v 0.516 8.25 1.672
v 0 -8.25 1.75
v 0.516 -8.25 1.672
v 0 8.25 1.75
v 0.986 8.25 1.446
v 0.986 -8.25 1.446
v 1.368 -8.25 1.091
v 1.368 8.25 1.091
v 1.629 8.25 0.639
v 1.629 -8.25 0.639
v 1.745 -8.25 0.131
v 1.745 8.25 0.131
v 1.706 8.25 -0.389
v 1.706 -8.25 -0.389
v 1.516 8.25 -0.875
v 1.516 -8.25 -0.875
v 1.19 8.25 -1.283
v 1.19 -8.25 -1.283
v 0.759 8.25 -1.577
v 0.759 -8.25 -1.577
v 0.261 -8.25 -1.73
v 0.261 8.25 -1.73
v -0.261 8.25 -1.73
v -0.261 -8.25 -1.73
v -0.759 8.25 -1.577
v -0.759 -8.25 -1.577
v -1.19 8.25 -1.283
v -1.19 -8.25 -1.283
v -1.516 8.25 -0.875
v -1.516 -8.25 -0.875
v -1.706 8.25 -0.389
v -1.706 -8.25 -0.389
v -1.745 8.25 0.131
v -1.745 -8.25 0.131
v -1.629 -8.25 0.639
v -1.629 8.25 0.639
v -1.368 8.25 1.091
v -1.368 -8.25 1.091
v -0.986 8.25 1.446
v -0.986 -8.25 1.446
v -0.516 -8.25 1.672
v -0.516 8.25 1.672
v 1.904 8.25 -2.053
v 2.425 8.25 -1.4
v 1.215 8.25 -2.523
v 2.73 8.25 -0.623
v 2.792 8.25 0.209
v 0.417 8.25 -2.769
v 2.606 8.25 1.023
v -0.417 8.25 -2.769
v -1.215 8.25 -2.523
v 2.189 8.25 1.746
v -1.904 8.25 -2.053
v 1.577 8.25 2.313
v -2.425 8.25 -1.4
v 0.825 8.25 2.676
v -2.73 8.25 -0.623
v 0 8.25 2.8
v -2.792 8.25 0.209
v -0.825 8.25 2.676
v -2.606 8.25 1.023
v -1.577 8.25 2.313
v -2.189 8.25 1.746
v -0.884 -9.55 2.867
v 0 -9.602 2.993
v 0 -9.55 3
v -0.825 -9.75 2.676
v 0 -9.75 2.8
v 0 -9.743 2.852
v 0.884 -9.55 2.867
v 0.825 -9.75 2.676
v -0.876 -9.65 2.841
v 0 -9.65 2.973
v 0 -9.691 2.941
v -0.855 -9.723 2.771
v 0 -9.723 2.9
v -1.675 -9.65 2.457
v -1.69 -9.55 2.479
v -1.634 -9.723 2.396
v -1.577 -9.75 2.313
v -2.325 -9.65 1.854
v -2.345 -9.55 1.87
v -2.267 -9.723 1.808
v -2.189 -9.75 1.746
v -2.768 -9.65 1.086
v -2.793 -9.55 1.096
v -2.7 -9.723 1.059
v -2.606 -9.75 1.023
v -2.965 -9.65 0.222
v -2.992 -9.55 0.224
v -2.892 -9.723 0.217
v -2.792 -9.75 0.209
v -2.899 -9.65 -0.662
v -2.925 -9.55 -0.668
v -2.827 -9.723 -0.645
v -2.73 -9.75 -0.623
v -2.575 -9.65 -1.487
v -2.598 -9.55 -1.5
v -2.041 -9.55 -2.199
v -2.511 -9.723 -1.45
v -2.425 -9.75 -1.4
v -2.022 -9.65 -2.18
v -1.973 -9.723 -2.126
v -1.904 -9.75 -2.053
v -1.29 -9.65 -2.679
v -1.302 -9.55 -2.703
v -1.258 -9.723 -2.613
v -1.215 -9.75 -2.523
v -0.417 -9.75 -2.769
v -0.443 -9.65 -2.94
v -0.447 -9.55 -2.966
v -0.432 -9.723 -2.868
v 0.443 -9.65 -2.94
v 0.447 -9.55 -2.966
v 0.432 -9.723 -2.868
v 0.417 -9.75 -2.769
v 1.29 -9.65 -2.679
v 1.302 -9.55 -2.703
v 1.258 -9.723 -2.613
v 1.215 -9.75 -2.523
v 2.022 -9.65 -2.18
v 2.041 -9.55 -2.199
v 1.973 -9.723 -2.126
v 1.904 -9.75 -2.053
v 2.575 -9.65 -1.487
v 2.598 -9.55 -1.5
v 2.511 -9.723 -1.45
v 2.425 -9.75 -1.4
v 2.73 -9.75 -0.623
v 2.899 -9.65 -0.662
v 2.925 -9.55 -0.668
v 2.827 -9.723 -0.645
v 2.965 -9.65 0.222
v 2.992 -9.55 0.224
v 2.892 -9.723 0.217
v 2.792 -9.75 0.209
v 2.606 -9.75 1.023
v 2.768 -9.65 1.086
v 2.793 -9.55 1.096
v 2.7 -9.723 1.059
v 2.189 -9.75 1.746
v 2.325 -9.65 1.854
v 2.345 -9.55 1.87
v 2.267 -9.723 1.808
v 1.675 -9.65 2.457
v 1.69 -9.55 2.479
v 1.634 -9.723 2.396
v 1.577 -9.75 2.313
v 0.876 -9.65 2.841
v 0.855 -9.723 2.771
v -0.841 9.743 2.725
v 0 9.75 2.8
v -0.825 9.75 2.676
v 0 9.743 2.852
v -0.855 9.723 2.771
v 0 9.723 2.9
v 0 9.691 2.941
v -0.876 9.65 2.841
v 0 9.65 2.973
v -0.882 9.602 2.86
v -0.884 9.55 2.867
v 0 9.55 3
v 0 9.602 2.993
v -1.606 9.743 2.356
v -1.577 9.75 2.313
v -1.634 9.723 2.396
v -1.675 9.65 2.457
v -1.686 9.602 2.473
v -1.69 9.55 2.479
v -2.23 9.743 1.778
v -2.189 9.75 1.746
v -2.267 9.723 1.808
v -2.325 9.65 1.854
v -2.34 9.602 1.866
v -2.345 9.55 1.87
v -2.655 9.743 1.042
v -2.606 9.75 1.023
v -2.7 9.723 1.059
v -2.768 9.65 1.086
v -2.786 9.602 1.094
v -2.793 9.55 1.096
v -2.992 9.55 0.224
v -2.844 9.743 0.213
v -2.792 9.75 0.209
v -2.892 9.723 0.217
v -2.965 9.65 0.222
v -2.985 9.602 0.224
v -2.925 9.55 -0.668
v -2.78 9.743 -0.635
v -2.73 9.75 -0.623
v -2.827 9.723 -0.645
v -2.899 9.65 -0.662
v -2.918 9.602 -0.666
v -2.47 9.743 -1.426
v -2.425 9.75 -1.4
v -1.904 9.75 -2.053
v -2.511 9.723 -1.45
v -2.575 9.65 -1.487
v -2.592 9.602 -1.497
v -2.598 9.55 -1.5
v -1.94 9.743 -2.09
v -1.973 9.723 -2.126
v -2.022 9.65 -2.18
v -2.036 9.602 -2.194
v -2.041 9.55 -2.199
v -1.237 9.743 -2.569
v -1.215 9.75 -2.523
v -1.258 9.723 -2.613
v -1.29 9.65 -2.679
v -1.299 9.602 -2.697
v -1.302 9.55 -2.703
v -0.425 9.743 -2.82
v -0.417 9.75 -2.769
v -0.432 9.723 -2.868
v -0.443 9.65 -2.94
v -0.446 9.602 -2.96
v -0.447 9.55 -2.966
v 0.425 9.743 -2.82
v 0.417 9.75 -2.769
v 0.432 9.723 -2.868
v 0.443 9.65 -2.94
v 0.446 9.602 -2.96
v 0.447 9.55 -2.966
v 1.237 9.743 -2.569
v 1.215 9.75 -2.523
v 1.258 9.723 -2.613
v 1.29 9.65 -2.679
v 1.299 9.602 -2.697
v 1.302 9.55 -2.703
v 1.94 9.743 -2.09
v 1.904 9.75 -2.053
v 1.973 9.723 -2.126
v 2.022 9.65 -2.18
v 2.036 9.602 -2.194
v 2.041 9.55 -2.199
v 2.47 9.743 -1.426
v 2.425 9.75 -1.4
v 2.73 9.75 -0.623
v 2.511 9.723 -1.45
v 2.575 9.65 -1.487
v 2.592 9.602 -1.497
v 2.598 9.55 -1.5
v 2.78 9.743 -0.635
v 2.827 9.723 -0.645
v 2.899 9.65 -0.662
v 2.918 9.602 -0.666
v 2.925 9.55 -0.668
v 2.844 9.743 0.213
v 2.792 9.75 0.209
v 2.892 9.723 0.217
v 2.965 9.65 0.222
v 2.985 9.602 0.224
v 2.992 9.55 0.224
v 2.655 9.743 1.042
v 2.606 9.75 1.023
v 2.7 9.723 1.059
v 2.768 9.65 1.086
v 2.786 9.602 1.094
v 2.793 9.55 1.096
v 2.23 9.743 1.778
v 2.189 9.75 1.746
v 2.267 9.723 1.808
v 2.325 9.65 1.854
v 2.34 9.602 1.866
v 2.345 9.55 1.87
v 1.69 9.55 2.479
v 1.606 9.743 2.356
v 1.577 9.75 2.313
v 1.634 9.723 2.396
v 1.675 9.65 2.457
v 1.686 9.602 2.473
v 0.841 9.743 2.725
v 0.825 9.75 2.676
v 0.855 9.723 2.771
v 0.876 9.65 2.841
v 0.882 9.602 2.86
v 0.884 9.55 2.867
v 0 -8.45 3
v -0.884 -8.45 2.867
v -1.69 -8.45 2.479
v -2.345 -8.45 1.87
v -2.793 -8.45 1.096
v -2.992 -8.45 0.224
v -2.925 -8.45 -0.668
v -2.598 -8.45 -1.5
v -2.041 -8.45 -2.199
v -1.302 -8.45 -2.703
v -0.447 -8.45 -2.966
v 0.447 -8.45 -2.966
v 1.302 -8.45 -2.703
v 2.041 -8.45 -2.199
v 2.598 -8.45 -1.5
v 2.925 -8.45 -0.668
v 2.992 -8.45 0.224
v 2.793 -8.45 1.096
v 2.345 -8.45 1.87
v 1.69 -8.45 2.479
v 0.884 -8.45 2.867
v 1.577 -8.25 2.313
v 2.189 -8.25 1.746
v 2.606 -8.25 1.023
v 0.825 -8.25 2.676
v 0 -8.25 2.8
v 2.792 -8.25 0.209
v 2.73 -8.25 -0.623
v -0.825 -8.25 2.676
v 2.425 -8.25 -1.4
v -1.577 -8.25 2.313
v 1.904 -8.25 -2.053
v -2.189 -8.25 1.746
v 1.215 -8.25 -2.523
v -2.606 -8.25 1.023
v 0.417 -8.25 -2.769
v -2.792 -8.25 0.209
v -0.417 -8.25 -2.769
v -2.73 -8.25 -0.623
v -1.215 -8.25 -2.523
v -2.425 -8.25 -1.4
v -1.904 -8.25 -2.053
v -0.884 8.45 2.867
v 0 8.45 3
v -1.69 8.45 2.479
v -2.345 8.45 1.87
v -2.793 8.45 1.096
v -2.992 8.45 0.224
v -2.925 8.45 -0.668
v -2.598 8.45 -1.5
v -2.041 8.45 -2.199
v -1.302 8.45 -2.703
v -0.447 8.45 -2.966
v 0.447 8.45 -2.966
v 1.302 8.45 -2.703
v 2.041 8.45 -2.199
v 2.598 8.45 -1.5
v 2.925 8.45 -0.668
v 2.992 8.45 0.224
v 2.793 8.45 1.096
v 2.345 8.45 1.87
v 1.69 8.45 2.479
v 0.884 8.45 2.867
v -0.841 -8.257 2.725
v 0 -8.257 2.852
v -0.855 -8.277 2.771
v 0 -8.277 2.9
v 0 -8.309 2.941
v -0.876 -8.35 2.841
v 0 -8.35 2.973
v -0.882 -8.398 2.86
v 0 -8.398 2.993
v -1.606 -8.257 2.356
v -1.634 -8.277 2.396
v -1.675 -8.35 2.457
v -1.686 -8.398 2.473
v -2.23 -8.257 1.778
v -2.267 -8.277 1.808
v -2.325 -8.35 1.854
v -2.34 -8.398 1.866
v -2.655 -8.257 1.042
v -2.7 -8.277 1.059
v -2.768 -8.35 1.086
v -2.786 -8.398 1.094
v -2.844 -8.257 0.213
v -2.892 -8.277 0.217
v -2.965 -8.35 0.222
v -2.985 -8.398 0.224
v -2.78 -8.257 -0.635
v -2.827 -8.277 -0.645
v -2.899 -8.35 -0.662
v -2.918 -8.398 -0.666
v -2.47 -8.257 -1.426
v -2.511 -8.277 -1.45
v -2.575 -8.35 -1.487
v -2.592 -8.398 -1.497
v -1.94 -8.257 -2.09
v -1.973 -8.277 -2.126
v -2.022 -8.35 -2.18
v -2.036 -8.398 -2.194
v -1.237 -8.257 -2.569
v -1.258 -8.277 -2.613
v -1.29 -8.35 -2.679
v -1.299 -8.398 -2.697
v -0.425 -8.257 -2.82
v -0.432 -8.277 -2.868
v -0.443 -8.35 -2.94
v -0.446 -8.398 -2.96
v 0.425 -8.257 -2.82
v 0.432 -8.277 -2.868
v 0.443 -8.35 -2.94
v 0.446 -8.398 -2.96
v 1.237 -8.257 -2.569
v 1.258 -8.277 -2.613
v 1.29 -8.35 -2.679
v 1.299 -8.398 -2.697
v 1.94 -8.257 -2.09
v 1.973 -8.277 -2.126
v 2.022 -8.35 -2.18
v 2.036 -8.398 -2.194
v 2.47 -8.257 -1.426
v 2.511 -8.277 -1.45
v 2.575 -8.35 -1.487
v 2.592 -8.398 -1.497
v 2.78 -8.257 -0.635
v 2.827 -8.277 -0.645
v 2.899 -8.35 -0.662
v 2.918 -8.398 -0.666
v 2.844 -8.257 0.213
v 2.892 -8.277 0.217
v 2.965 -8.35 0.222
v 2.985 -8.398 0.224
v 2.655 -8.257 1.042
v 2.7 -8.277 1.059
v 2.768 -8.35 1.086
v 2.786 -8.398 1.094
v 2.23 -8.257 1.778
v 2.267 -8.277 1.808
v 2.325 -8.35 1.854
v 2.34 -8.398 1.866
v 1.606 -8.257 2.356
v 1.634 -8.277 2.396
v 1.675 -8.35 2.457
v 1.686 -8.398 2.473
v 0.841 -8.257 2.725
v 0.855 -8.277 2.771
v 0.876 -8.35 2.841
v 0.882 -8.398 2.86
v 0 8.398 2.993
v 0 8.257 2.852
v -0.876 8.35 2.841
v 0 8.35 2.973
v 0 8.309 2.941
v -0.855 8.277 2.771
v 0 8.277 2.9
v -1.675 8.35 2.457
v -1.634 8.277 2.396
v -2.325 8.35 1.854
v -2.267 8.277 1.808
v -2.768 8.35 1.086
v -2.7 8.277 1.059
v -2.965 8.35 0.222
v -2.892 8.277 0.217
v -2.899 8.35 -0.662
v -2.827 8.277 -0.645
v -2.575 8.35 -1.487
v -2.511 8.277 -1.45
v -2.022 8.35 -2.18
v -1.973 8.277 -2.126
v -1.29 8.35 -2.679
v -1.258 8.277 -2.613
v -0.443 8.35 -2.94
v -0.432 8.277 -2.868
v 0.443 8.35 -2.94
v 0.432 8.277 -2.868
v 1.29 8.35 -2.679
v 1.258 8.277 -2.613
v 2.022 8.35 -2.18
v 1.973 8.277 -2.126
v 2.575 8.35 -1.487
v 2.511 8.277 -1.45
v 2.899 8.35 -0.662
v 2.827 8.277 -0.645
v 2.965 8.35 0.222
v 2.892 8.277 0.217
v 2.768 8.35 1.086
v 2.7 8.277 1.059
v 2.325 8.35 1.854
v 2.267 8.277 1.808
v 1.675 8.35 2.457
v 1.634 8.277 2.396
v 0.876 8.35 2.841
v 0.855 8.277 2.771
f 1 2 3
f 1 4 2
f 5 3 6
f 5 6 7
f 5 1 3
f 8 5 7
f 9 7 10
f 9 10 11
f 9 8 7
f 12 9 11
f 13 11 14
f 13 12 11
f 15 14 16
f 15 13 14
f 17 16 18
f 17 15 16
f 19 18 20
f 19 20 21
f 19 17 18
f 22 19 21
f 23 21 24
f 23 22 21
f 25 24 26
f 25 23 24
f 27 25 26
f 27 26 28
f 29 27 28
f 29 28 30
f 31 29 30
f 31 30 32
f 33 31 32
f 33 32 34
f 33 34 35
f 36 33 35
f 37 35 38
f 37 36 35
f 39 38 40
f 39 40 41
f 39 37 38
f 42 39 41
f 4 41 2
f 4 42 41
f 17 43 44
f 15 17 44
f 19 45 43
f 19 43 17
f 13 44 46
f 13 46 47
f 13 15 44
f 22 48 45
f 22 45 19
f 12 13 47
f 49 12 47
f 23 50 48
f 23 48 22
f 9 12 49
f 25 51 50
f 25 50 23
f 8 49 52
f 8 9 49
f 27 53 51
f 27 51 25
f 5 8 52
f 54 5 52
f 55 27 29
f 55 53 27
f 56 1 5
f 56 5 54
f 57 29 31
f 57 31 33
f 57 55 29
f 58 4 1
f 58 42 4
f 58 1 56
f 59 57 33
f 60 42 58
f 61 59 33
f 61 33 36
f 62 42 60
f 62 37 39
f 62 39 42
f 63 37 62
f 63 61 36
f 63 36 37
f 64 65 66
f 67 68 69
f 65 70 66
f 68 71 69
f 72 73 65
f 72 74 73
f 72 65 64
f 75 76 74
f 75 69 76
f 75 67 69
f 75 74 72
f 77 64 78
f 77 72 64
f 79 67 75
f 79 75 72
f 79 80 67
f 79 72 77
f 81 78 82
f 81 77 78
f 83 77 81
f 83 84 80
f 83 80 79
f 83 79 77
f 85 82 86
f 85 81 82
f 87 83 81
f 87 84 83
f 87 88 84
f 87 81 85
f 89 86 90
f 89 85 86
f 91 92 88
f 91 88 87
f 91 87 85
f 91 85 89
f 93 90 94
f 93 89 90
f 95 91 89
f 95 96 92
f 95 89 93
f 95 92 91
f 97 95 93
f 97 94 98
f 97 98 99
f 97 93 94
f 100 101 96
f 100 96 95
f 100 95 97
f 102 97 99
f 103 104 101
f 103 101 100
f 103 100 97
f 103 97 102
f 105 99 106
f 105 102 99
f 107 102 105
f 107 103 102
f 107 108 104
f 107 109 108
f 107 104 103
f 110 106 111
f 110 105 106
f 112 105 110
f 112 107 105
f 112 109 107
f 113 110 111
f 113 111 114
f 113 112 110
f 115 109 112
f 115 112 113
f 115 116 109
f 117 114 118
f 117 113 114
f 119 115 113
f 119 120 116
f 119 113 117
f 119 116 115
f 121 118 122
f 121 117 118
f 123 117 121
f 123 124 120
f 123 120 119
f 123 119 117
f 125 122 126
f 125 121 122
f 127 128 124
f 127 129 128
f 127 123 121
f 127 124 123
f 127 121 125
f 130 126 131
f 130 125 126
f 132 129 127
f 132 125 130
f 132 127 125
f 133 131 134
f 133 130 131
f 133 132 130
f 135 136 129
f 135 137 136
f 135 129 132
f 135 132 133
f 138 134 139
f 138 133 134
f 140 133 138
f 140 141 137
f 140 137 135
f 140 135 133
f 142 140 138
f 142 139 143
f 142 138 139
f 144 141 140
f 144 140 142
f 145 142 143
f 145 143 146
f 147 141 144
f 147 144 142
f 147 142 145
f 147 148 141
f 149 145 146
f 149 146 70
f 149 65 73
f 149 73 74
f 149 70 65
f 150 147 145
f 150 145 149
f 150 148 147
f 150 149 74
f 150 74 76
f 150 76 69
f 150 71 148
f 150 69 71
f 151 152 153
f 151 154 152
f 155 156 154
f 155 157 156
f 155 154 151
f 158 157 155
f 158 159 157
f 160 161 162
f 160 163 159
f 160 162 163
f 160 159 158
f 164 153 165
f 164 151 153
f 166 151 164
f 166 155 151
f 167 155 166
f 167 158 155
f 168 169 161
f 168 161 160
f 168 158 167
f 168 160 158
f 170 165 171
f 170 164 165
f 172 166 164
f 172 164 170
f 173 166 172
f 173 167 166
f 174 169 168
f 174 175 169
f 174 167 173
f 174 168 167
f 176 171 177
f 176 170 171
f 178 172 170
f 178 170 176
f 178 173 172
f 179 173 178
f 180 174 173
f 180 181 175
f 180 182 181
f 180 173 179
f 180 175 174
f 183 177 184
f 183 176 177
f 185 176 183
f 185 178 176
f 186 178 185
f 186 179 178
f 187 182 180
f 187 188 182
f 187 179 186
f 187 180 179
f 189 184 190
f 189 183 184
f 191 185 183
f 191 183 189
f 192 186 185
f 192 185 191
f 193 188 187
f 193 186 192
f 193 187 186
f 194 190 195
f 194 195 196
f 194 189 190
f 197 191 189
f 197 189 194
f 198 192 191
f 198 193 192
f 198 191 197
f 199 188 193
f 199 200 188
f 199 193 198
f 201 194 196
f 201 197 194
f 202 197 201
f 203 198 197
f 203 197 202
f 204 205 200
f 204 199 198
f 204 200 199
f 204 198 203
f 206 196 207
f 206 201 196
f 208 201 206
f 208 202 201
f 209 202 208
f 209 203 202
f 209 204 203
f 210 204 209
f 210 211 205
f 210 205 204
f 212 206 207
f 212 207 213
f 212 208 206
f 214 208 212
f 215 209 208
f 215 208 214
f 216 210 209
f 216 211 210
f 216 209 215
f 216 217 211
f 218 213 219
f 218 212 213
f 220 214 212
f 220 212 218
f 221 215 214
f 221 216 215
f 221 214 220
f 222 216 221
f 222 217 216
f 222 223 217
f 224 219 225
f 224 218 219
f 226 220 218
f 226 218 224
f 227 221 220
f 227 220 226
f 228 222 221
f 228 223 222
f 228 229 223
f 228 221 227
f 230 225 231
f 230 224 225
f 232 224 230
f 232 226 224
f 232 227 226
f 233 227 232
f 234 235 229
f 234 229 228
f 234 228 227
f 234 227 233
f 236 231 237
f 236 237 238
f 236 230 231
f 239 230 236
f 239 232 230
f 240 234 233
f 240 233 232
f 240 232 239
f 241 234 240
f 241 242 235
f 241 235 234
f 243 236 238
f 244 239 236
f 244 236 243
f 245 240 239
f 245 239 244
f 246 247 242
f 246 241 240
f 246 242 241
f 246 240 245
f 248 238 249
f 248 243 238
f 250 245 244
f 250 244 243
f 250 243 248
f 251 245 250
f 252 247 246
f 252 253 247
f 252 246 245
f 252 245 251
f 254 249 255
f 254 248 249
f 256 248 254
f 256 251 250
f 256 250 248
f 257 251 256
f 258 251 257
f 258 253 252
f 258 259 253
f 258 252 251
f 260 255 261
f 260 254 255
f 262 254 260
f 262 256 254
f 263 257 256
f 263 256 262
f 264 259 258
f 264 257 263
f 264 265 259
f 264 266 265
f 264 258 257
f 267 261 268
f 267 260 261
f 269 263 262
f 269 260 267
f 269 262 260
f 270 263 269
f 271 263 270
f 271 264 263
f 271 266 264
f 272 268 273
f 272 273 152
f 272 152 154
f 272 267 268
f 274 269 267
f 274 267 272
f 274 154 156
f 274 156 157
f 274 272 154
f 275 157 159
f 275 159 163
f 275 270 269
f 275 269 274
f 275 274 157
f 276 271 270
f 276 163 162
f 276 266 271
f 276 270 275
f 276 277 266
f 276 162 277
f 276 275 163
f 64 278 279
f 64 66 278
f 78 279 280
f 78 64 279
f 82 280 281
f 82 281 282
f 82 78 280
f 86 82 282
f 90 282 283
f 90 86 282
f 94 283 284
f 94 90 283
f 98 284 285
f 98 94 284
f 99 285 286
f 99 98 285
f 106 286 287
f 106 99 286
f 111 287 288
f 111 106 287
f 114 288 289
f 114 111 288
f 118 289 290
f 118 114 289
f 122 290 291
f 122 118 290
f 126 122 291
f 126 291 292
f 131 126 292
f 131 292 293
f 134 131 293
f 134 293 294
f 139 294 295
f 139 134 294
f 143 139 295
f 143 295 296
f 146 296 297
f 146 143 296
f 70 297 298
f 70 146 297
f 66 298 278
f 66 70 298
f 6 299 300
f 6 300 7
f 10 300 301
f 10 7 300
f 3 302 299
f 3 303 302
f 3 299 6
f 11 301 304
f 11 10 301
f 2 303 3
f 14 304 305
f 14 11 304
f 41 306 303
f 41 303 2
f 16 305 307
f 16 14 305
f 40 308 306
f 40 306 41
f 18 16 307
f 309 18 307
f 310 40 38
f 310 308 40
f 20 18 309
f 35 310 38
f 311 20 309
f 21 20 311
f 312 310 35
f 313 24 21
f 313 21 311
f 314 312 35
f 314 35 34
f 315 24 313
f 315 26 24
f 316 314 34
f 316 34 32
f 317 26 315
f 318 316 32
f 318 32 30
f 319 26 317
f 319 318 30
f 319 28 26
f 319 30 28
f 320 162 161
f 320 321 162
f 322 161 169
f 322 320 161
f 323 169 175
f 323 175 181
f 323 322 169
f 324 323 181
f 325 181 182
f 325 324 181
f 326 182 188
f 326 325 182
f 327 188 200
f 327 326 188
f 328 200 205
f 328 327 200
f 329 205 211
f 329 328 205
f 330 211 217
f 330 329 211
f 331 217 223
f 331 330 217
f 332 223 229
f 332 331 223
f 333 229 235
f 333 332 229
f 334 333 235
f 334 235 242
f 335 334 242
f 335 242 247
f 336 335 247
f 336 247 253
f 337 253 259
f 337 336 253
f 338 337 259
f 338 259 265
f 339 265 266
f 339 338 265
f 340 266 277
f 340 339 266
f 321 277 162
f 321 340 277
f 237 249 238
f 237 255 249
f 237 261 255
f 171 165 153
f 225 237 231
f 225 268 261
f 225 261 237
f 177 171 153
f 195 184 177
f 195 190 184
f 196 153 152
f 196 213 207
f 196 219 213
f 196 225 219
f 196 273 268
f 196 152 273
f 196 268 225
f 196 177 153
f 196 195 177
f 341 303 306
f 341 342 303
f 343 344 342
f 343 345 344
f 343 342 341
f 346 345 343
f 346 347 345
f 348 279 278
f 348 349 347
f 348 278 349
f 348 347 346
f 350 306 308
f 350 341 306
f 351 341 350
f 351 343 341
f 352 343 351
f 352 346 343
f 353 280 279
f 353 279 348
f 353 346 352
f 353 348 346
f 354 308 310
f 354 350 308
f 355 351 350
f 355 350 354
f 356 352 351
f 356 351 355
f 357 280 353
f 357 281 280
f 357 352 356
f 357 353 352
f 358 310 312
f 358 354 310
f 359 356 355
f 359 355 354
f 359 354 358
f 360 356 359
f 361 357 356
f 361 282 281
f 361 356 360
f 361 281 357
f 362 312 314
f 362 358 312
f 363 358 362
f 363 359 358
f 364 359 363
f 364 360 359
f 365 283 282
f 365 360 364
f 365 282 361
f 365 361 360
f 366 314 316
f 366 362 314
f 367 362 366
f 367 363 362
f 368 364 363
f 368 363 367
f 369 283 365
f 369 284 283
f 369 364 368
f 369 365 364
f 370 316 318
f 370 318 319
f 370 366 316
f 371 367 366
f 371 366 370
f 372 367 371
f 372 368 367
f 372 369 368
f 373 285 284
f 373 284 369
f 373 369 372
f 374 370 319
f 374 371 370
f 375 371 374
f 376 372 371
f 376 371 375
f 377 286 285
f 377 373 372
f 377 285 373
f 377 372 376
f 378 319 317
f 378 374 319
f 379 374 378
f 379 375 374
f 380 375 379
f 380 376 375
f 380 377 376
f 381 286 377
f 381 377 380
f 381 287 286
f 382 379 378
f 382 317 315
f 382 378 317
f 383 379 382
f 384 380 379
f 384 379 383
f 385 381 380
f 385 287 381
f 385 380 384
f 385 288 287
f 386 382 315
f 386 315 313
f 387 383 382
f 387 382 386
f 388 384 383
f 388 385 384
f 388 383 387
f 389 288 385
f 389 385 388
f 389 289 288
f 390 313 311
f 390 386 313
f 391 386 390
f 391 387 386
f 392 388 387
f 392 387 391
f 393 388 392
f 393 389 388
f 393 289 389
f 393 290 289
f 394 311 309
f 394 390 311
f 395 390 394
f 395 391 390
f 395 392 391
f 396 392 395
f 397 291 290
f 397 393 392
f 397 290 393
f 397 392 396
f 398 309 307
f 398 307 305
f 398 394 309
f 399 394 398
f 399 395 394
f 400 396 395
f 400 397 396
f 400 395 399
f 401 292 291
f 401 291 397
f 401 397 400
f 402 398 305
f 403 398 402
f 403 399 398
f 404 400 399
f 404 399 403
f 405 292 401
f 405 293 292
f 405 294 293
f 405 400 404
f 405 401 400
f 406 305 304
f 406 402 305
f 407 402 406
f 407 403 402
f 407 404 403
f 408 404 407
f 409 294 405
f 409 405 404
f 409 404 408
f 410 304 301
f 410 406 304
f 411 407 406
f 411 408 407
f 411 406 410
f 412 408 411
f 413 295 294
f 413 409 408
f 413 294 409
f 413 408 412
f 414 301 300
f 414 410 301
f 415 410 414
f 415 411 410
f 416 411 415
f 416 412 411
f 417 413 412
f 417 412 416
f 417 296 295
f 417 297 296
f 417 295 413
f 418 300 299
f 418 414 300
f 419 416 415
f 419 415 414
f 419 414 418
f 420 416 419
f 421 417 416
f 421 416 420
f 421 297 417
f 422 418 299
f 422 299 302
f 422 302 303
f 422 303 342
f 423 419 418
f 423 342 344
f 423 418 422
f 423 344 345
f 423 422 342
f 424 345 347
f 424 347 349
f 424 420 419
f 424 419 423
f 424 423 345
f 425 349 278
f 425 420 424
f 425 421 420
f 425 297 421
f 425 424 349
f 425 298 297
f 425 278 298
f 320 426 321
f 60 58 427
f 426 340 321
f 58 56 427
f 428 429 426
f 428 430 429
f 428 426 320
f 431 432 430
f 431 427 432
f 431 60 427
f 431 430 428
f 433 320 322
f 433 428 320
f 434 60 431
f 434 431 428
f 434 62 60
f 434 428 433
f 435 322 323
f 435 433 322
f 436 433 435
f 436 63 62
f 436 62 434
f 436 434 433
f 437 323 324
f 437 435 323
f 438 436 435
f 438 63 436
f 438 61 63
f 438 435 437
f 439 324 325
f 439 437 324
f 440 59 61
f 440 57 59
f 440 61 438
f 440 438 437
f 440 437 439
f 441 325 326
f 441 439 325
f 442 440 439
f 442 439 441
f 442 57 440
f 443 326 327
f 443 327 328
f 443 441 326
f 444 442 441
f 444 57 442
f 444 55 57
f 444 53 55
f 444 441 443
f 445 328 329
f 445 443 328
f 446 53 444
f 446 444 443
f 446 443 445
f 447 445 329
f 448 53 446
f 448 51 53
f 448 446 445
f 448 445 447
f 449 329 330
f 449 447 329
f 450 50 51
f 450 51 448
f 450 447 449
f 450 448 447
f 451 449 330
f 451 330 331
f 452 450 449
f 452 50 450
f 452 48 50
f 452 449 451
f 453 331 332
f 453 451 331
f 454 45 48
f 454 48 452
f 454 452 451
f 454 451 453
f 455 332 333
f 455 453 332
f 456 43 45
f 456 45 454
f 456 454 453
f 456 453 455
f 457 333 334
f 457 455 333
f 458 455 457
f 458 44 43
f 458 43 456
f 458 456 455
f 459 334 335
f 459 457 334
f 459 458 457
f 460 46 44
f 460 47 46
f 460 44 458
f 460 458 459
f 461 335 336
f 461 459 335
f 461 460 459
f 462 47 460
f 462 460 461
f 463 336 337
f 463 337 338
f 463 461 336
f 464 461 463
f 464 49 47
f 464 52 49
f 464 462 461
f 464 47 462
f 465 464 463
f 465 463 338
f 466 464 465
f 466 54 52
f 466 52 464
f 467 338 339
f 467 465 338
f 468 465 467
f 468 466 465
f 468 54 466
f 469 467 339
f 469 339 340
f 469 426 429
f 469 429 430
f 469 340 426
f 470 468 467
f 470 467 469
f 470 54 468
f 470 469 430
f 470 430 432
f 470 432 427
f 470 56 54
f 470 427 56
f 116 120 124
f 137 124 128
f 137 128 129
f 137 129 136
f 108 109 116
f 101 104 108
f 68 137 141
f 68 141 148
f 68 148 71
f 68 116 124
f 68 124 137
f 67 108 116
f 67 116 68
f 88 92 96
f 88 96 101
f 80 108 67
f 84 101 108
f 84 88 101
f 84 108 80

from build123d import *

# Parameters (mm, degrees)
SKETCH1_R           = 1.75
BOSS_EXTRUDE1_DEPTH = 8.25


with BuildPart() as part:
    # Sketch1 → Boss-Extrude1 (new, symmetric)
    with BuildSketch(Plane(origin=(0, 0, 0), x_dir=(1, 0, 0), z_dir=(0, 1, 0))):
        with Locations(Location((0, 0, 0), (0, 0, 270))):
            Circle(SKETCH1_R)
    extrude(amount=BOSS_EXTRUDE1_DEPTH, both=True)

    # Sketch2 → Revolve2 (revolve)
    with BuildSketch(Plane.XY, mode=Mode.PRIVATE) as revolve2_sk:
        with BuildLine():
            Line((-2.8, 8.25), (0, 8.25))
            Line((0, 8.25), (0, 9.75))
            Line((0, 9.75), (-2.8, 9.75))
            ThreePointArc((-2.8, 9.75), (-2.941421356, 9.691421356), (-3, 9.55))
            Line((-3, 9.55), (-3, 8.45))
            ThreePointArc((-3, 8.45), (-2.941421356, 8.308578644), (-2.8, 8.25))
        make_face()
        with BuildLine():
            Line((0, -9.75), (0, -8.25))
            Line((0, -8.25), (-2.8, -8.25))
            ThreePointArc((-2.8, -8.25), (-2.941421356, -8.308578644), (-3, -8.45))
            Line((-3, -8.45), (-3, -9.55))
            ThreePointArc((-3, -9.55), (-2.941421356, -9.691421356), (-2.8, -9.75))
            Line((-2.8, -9.75), (0, -9.75))
        make_face()
    revolve(revolve2_sk.sketch.rotate(Axis((0, 9.75, 0), (0, -1, 0)), 270), axis=Axis((0, 9.75, 0), (0, -1, 0)))


solid = part.part
